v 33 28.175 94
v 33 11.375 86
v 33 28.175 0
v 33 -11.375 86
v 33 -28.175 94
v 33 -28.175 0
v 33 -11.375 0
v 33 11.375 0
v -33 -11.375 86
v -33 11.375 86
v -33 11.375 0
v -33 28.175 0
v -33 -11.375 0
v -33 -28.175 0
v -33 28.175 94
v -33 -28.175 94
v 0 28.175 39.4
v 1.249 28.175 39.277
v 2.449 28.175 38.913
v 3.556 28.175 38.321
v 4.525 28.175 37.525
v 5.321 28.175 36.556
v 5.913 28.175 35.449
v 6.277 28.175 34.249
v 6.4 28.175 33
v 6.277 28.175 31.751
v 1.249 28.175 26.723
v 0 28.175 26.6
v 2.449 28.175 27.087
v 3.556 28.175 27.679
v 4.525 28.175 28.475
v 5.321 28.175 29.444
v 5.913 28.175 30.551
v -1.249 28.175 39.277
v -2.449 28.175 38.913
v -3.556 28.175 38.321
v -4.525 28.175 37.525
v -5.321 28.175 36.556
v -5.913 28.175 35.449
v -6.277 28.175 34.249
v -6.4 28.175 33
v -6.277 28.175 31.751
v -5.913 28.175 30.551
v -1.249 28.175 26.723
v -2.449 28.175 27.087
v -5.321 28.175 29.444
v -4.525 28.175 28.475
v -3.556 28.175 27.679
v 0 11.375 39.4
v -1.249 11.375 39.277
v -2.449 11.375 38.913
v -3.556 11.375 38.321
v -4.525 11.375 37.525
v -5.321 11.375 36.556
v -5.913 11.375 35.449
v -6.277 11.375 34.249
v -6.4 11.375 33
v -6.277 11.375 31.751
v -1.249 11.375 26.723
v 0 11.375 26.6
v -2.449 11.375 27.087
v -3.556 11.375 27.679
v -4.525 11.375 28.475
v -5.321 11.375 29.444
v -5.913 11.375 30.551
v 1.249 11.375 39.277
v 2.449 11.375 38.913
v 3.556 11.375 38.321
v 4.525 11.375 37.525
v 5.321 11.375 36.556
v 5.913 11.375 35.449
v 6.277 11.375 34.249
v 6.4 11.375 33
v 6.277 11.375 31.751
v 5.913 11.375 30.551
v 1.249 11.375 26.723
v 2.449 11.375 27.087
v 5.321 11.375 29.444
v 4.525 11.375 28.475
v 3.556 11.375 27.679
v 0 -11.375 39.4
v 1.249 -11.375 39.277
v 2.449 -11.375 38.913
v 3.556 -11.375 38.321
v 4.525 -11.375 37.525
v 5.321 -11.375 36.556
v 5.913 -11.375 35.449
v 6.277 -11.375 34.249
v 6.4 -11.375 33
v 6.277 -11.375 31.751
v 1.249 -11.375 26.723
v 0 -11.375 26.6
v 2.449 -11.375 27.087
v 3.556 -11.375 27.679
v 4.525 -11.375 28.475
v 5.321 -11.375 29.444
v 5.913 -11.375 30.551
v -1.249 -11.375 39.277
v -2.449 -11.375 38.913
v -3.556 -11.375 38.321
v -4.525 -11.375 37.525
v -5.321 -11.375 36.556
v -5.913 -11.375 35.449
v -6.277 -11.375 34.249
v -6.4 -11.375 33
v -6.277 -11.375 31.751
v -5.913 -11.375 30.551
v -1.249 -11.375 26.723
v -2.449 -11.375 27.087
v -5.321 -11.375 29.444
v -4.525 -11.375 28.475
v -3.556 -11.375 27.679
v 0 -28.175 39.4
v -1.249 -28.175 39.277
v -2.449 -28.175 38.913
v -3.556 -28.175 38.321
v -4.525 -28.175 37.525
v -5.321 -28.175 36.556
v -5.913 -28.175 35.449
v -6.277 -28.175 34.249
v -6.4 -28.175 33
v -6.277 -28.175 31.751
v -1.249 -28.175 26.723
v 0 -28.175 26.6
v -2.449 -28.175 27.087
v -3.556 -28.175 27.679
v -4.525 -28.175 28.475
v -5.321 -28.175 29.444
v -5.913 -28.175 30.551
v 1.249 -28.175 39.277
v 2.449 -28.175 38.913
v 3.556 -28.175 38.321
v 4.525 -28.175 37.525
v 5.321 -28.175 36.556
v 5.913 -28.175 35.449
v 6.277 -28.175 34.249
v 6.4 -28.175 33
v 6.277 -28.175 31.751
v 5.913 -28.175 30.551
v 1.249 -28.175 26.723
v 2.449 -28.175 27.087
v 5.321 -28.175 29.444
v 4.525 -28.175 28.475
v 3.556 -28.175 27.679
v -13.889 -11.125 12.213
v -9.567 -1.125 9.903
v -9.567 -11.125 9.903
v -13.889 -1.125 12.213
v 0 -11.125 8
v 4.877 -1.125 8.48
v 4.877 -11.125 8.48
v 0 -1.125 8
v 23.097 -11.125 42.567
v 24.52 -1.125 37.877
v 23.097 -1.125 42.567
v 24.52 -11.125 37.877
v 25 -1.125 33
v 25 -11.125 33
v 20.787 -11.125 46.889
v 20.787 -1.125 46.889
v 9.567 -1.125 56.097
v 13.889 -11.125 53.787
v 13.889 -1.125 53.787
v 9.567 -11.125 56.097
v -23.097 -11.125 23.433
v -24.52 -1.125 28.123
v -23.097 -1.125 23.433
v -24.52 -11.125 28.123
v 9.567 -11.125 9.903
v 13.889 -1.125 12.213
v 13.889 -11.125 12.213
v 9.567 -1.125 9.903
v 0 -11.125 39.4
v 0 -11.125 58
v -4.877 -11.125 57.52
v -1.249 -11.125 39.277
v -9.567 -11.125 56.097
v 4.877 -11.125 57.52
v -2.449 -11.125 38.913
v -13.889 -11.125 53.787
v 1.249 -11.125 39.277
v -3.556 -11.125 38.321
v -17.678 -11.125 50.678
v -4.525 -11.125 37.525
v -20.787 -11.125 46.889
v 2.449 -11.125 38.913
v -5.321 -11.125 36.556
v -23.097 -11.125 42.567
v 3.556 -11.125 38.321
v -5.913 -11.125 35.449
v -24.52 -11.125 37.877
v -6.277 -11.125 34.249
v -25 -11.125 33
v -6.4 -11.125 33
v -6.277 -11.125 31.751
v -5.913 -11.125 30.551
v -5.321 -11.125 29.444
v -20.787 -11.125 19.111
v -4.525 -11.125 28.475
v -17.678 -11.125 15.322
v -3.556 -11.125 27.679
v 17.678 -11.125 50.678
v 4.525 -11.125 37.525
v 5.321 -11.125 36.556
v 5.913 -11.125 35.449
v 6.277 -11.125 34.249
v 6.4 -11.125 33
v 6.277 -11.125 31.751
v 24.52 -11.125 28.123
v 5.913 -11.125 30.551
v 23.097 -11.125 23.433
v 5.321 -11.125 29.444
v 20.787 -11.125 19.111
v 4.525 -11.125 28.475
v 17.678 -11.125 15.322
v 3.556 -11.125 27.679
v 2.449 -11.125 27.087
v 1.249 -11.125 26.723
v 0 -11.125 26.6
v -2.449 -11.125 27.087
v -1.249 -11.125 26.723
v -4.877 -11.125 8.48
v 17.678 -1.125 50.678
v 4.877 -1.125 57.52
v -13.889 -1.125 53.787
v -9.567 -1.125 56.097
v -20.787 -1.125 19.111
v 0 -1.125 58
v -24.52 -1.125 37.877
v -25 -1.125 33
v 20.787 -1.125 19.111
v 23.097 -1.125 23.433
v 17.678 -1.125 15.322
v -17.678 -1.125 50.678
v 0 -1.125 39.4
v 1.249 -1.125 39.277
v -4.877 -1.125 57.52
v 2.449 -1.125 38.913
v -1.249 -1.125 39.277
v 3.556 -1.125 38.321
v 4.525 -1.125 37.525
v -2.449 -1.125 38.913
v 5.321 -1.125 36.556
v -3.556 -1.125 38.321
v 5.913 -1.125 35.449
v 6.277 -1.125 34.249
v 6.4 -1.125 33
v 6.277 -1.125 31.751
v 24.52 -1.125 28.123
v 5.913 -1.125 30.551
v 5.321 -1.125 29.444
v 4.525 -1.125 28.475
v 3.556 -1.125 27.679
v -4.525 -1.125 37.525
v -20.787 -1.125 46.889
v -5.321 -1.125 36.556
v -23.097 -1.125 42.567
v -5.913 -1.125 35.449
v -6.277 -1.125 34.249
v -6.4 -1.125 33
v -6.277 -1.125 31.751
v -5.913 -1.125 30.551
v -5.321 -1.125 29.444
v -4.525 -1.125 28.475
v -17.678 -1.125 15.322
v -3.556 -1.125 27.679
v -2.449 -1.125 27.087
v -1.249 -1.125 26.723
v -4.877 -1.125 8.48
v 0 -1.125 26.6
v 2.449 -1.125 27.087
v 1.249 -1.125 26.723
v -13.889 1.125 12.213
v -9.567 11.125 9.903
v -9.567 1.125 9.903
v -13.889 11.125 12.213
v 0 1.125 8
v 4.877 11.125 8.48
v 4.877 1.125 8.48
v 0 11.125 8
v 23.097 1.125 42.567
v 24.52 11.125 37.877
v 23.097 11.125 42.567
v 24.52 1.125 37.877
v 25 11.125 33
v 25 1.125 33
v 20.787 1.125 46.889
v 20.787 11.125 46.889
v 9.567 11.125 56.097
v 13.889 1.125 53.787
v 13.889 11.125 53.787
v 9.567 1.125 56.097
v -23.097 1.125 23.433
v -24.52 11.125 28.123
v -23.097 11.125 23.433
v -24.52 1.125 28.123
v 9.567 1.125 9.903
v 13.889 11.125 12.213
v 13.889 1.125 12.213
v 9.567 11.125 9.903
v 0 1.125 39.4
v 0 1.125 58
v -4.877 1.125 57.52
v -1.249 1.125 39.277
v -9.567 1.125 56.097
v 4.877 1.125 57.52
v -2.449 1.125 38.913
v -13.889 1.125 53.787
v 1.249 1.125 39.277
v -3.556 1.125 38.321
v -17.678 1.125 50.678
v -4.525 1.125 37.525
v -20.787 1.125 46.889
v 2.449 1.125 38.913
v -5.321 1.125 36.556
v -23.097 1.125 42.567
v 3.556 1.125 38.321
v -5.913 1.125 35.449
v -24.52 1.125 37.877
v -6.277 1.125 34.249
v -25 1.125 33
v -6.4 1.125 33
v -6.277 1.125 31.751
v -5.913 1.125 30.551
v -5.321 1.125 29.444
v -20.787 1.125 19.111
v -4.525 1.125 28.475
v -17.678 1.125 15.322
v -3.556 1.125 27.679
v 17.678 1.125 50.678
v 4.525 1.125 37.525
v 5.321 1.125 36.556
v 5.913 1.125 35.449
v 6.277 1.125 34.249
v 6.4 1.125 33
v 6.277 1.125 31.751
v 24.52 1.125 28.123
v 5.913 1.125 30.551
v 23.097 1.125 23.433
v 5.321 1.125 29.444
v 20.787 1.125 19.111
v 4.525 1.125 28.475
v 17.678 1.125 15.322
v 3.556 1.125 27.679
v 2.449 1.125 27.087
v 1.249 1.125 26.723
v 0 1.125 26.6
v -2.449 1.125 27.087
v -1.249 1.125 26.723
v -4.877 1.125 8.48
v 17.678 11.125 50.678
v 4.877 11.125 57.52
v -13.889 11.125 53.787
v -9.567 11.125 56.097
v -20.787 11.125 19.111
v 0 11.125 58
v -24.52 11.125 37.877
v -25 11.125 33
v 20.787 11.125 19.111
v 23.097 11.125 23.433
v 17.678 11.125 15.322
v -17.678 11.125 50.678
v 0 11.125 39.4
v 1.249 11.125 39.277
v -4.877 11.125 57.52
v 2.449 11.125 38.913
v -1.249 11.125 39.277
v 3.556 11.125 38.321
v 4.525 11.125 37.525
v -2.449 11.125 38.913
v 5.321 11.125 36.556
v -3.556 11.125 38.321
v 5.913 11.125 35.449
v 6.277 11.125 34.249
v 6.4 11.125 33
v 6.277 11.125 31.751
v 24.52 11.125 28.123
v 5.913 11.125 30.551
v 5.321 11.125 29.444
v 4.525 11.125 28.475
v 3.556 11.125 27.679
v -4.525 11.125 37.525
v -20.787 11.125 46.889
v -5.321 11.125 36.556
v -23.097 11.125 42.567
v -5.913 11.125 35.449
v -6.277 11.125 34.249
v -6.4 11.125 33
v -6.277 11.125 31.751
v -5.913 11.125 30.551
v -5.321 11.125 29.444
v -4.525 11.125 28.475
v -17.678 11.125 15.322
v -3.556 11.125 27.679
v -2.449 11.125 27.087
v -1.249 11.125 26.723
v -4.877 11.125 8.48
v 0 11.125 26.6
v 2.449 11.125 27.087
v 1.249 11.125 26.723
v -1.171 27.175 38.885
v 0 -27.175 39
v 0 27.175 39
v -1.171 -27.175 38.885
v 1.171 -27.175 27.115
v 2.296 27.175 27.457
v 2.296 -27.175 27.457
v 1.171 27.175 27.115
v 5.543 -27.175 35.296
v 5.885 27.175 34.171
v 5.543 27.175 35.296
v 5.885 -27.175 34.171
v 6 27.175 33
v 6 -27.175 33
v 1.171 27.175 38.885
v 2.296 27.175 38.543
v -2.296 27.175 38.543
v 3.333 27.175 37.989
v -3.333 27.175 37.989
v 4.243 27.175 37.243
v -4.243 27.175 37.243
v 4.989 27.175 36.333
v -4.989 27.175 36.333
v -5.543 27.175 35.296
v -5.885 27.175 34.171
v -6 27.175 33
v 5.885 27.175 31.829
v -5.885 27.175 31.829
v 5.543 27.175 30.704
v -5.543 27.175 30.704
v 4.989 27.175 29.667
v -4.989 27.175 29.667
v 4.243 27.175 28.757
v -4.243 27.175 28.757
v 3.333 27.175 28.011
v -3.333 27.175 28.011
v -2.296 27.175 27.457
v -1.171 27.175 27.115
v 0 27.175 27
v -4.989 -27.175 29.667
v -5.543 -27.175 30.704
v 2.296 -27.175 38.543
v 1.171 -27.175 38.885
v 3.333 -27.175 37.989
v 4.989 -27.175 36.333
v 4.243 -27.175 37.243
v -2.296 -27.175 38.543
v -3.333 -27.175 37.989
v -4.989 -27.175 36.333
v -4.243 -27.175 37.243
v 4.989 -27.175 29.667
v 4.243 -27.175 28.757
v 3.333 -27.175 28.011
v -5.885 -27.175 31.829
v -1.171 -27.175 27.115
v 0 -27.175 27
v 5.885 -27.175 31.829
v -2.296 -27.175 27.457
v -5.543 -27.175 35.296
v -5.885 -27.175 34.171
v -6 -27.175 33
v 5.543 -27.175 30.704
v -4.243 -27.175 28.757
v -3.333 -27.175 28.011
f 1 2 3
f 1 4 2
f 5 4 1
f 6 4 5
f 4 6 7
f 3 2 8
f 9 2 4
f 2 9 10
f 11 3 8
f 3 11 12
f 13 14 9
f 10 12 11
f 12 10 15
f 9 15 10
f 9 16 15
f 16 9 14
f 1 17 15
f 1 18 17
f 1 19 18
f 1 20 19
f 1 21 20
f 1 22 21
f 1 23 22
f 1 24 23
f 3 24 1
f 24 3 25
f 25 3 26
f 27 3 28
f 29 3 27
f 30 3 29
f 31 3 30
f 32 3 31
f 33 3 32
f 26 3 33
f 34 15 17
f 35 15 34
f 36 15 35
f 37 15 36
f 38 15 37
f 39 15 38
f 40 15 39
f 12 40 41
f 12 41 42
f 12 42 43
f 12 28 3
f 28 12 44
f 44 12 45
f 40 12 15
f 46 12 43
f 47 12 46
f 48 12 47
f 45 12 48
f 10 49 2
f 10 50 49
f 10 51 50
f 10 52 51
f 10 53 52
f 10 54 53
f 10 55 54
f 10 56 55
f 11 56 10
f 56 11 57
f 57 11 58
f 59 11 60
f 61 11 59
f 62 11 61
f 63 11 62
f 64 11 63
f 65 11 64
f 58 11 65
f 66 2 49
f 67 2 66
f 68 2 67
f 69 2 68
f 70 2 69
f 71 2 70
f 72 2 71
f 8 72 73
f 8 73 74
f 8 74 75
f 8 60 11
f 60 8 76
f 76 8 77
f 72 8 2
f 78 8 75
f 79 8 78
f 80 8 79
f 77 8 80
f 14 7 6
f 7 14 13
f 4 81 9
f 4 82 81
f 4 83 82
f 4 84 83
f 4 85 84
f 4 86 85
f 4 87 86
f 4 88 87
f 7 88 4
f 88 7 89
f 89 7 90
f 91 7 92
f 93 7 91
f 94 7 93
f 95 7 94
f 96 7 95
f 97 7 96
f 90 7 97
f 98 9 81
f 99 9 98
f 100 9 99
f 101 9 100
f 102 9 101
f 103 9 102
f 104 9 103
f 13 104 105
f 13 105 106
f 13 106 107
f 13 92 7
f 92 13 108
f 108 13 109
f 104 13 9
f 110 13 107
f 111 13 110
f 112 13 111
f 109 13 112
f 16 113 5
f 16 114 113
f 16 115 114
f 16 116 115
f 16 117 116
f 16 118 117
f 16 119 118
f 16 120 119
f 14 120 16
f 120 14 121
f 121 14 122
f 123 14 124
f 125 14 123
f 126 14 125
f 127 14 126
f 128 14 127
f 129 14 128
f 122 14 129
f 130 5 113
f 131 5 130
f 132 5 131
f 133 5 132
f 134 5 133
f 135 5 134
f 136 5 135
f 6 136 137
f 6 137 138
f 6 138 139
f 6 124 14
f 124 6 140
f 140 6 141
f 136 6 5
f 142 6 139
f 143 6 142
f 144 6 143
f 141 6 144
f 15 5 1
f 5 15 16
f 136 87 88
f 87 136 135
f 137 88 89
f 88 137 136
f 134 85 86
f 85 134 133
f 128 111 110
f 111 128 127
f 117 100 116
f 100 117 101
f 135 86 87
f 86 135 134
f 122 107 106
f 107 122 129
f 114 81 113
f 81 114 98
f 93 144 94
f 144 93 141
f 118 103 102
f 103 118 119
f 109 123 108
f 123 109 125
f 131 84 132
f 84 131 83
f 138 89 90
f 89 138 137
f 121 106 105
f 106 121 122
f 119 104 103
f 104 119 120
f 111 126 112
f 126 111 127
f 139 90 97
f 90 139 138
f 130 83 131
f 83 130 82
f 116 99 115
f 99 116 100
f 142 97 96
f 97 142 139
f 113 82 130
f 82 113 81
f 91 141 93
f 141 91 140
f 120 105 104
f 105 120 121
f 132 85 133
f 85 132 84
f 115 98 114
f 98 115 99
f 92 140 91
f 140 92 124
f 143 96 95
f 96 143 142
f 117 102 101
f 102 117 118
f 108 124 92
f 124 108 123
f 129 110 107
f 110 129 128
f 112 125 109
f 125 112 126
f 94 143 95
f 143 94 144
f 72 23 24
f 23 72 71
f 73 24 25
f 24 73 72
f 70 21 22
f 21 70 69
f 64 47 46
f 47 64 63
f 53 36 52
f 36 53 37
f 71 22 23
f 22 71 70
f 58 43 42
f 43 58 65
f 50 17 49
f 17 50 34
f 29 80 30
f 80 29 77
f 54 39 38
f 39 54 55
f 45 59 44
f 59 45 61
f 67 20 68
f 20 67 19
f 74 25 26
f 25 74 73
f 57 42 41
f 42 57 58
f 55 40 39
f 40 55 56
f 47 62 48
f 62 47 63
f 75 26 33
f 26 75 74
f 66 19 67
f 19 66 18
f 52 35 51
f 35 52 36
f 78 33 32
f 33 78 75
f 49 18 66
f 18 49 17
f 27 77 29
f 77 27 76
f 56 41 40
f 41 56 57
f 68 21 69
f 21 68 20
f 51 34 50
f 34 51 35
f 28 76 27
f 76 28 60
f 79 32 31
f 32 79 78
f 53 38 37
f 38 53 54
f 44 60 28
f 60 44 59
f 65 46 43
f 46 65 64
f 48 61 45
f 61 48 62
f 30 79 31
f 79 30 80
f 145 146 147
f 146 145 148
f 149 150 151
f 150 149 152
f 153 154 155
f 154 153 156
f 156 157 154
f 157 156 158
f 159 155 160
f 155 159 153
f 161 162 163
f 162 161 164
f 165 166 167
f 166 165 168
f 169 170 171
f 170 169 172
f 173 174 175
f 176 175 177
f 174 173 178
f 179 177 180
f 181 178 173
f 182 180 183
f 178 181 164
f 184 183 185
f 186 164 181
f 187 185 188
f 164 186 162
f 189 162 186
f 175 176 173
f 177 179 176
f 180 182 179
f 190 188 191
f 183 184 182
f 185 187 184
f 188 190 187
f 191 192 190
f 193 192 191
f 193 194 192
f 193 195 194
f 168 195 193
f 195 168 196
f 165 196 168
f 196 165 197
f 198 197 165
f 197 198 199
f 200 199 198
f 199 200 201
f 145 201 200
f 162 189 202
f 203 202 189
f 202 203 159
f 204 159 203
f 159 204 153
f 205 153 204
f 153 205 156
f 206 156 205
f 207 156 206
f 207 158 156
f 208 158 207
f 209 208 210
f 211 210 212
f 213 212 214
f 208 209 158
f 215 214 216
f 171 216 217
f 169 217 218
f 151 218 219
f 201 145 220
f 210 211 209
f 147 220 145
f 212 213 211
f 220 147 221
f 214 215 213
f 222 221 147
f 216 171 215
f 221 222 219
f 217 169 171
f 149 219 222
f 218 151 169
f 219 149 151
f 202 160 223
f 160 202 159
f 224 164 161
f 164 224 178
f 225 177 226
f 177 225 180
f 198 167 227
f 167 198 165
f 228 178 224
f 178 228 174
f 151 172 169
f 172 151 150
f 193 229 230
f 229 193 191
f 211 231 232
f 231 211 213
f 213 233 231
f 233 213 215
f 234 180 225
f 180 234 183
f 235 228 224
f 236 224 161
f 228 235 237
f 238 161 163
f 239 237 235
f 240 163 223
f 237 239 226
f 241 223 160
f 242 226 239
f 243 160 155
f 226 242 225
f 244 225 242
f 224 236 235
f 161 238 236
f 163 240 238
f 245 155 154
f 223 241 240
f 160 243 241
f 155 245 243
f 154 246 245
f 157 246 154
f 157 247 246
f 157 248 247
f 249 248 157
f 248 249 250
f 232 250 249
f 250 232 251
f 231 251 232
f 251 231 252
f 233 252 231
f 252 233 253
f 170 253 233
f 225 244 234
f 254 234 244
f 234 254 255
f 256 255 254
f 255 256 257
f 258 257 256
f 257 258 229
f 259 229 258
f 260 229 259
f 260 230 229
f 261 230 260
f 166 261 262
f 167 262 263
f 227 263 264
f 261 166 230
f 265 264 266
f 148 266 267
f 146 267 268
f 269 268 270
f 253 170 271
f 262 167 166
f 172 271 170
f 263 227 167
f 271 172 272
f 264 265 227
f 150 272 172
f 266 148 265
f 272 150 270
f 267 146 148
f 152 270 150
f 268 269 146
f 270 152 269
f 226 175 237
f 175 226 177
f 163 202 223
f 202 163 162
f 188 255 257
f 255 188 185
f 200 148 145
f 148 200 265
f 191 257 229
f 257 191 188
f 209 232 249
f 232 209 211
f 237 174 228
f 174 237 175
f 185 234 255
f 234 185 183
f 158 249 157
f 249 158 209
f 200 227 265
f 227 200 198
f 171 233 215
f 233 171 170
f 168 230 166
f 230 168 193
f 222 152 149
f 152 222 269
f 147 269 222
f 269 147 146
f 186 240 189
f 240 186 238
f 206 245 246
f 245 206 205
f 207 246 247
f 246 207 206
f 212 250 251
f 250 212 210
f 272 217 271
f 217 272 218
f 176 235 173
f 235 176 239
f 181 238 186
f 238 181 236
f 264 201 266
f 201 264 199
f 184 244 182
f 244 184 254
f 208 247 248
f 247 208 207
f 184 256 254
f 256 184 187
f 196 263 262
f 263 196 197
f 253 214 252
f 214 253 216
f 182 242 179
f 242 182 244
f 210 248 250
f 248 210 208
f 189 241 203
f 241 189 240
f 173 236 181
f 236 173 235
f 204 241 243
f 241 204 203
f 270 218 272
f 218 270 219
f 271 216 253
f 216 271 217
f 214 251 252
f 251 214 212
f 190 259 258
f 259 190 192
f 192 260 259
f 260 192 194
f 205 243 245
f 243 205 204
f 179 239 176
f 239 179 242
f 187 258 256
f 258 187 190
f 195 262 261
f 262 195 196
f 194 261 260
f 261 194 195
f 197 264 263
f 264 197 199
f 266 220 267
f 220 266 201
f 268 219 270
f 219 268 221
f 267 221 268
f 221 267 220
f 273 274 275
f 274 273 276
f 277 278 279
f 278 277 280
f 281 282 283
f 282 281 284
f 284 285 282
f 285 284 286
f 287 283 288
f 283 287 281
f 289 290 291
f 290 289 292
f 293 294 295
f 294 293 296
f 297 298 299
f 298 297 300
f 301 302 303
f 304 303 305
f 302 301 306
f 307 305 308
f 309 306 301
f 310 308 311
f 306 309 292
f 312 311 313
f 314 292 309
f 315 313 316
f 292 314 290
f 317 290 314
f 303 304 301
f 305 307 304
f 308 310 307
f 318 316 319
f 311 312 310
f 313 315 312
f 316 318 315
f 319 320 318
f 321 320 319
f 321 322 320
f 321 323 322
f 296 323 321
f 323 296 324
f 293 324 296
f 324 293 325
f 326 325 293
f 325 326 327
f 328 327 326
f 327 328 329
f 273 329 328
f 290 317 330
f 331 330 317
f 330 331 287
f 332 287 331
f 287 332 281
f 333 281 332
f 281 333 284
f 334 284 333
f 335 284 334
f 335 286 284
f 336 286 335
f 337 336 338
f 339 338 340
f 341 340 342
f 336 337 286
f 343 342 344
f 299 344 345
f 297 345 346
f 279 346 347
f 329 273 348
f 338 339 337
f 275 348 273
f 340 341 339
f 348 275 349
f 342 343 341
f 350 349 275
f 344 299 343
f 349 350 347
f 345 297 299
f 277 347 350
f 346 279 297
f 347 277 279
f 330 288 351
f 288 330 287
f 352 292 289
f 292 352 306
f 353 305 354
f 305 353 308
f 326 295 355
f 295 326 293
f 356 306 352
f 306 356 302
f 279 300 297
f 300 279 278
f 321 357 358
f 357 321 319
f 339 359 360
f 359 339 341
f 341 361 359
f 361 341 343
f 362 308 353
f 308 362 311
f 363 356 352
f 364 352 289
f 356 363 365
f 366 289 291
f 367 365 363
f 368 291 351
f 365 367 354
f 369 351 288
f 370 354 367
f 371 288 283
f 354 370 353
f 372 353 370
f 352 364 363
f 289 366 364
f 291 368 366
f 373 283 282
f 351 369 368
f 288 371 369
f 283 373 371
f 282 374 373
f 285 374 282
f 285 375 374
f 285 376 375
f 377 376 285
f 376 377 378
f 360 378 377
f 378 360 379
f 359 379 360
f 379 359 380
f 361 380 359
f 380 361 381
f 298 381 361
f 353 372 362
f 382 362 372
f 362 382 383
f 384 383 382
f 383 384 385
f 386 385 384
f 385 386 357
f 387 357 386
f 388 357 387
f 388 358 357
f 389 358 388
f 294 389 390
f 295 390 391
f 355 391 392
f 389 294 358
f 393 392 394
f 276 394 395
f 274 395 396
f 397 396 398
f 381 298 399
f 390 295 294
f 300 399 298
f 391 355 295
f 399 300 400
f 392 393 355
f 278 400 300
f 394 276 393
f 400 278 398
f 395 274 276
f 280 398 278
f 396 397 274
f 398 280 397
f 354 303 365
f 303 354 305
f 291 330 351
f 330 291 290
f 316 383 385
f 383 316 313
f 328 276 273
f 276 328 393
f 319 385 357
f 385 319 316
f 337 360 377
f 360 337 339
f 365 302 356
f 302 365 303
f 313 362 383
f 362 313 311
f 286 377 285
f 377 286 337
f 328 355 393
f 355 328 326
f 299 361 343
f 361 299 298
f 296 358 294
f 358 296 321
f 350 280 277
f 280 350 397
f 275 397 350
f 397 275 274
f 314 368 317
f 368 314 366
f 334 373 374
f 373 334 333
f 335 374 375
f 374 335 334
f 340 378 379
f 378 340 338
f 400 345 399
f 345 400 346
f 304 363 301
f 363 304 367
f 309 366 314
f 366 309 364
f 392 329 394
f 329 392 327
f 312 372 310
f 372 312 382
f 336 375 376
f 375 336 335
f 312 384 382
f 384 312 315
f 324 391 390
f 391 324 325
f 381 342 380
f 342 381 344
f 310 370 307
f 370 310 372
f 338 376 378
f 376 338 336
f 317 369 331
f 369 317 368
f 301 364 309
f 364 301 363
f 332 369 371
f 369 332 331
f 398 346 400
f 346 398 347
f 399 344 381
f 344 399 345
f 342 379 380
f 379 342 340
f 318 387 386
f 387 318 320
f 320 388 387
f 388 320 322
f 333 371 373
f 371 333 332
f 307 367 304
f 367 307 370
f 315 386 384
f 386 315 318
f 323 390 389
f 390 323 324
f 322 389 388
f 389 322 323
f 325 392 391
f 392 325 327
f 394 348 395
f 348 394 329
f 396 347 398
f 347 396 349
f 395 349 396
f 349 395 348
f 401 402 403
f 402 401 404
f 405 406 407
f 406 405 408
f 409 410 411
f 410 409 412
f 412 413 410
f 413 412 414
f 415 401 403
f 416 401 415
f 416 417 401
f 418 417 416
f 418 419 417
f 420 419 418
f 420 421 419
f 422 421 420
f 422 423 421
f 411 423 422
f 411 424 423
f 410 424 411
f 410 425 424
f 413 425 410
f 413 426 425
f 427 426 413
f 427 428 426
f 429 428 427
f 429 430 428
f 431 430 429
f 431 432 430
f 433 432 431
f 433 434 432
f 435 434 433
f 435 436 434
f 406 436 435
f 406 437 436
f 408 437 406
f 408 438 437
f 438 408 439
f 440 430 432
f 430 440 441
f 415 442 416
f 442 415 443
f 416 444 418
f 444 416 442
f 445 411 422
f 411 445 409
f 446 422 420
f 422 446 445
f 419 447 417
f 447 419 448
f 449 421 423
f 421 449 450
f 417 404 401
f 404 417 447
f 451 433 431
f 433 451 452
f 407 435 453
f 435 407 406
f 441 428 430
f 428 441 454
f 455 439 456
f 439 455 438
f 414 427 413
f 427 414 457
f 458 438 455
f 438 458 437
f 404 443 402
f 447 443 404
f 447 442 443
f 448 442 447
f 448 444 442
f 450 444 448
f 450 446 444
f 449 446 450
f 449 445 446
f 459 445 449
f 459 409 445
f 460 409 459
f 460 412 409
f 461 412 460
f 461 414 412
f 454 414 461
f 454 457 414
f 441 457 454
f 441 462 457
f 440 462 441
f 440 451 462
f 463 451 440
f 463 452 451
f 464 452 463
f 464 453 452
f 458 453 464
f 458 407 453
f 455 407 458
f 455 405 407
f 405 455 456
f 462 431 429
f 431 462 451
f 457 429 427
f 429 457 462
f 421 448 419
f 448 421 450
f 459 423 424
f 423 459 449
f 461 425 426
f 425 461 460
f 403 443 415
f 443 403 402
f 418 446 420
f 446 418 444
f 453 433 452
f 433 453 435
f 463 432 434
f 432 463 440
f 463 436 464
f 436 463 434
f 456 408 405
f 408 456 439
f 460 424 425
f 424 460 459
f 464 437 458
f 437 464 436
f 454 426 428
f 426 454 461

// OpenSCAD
$fn = 32;

// ------------------------------------------------------------------------
// Trolley wheel set: wheels d50, fork 86 mm tall
// Every part is its own module, assembly() places every instance.
// ------------------------------------------------------------------------

// --- part 1 ---
module trolley_fork() {
  difference() {
    union() {
      translate([-33, 11.375, 0]) cube([66, 16.8, 86]);
      translate([-33, -28.175, 0]) cube([66, 16.8, 86]);
      translate([-33, -28.175, 86]) cube([66, 56.35, 8]);
    }
    translate([0, -19.775, 33]) rotate([90, 0, 0]) cylinder(h = 18.8, d = 12.8, center = true);
    translate([0, 19.775, 33]) rotate([90, 0, 0]) cylinder(h = 18.8, d = 12.8, center = true);
  }
}

// --- part 2 ---
module trolley_wheel() {
  difference() {
      translate([0, 0, 0]) cylinder(h = 10, d = 50);
      translate([0, 0, -1]) cylinder(h = 12, d = 12.8);
    }
}

// --- part 3 ---
module trolley_axle() {
  translate([0, 0, -27.175]) cylinder(h = 54.35, d = 12);
}

// --- assembly ---
module assembly() {
  color([0.80, 0.24, 0.20]) translate([0, 0, 0]) rotate([0, 0, 0]) trolley_fork();
  color([0.20, 0.45, 0.75]) translate([0, -1.125, 33]) rotate([90, 0, 0]) trolley_wheel();
  color([0.25, 0.62, 0.32]) translate([0, 11.125, 33]) rotate([90, 0, 0]) trolley_wheel();
  color([0.92, 0.70, 0.18]) translate([0, 0, 33]) rotate([90, 0, 0]) trolley_axle();
}

assembly();
